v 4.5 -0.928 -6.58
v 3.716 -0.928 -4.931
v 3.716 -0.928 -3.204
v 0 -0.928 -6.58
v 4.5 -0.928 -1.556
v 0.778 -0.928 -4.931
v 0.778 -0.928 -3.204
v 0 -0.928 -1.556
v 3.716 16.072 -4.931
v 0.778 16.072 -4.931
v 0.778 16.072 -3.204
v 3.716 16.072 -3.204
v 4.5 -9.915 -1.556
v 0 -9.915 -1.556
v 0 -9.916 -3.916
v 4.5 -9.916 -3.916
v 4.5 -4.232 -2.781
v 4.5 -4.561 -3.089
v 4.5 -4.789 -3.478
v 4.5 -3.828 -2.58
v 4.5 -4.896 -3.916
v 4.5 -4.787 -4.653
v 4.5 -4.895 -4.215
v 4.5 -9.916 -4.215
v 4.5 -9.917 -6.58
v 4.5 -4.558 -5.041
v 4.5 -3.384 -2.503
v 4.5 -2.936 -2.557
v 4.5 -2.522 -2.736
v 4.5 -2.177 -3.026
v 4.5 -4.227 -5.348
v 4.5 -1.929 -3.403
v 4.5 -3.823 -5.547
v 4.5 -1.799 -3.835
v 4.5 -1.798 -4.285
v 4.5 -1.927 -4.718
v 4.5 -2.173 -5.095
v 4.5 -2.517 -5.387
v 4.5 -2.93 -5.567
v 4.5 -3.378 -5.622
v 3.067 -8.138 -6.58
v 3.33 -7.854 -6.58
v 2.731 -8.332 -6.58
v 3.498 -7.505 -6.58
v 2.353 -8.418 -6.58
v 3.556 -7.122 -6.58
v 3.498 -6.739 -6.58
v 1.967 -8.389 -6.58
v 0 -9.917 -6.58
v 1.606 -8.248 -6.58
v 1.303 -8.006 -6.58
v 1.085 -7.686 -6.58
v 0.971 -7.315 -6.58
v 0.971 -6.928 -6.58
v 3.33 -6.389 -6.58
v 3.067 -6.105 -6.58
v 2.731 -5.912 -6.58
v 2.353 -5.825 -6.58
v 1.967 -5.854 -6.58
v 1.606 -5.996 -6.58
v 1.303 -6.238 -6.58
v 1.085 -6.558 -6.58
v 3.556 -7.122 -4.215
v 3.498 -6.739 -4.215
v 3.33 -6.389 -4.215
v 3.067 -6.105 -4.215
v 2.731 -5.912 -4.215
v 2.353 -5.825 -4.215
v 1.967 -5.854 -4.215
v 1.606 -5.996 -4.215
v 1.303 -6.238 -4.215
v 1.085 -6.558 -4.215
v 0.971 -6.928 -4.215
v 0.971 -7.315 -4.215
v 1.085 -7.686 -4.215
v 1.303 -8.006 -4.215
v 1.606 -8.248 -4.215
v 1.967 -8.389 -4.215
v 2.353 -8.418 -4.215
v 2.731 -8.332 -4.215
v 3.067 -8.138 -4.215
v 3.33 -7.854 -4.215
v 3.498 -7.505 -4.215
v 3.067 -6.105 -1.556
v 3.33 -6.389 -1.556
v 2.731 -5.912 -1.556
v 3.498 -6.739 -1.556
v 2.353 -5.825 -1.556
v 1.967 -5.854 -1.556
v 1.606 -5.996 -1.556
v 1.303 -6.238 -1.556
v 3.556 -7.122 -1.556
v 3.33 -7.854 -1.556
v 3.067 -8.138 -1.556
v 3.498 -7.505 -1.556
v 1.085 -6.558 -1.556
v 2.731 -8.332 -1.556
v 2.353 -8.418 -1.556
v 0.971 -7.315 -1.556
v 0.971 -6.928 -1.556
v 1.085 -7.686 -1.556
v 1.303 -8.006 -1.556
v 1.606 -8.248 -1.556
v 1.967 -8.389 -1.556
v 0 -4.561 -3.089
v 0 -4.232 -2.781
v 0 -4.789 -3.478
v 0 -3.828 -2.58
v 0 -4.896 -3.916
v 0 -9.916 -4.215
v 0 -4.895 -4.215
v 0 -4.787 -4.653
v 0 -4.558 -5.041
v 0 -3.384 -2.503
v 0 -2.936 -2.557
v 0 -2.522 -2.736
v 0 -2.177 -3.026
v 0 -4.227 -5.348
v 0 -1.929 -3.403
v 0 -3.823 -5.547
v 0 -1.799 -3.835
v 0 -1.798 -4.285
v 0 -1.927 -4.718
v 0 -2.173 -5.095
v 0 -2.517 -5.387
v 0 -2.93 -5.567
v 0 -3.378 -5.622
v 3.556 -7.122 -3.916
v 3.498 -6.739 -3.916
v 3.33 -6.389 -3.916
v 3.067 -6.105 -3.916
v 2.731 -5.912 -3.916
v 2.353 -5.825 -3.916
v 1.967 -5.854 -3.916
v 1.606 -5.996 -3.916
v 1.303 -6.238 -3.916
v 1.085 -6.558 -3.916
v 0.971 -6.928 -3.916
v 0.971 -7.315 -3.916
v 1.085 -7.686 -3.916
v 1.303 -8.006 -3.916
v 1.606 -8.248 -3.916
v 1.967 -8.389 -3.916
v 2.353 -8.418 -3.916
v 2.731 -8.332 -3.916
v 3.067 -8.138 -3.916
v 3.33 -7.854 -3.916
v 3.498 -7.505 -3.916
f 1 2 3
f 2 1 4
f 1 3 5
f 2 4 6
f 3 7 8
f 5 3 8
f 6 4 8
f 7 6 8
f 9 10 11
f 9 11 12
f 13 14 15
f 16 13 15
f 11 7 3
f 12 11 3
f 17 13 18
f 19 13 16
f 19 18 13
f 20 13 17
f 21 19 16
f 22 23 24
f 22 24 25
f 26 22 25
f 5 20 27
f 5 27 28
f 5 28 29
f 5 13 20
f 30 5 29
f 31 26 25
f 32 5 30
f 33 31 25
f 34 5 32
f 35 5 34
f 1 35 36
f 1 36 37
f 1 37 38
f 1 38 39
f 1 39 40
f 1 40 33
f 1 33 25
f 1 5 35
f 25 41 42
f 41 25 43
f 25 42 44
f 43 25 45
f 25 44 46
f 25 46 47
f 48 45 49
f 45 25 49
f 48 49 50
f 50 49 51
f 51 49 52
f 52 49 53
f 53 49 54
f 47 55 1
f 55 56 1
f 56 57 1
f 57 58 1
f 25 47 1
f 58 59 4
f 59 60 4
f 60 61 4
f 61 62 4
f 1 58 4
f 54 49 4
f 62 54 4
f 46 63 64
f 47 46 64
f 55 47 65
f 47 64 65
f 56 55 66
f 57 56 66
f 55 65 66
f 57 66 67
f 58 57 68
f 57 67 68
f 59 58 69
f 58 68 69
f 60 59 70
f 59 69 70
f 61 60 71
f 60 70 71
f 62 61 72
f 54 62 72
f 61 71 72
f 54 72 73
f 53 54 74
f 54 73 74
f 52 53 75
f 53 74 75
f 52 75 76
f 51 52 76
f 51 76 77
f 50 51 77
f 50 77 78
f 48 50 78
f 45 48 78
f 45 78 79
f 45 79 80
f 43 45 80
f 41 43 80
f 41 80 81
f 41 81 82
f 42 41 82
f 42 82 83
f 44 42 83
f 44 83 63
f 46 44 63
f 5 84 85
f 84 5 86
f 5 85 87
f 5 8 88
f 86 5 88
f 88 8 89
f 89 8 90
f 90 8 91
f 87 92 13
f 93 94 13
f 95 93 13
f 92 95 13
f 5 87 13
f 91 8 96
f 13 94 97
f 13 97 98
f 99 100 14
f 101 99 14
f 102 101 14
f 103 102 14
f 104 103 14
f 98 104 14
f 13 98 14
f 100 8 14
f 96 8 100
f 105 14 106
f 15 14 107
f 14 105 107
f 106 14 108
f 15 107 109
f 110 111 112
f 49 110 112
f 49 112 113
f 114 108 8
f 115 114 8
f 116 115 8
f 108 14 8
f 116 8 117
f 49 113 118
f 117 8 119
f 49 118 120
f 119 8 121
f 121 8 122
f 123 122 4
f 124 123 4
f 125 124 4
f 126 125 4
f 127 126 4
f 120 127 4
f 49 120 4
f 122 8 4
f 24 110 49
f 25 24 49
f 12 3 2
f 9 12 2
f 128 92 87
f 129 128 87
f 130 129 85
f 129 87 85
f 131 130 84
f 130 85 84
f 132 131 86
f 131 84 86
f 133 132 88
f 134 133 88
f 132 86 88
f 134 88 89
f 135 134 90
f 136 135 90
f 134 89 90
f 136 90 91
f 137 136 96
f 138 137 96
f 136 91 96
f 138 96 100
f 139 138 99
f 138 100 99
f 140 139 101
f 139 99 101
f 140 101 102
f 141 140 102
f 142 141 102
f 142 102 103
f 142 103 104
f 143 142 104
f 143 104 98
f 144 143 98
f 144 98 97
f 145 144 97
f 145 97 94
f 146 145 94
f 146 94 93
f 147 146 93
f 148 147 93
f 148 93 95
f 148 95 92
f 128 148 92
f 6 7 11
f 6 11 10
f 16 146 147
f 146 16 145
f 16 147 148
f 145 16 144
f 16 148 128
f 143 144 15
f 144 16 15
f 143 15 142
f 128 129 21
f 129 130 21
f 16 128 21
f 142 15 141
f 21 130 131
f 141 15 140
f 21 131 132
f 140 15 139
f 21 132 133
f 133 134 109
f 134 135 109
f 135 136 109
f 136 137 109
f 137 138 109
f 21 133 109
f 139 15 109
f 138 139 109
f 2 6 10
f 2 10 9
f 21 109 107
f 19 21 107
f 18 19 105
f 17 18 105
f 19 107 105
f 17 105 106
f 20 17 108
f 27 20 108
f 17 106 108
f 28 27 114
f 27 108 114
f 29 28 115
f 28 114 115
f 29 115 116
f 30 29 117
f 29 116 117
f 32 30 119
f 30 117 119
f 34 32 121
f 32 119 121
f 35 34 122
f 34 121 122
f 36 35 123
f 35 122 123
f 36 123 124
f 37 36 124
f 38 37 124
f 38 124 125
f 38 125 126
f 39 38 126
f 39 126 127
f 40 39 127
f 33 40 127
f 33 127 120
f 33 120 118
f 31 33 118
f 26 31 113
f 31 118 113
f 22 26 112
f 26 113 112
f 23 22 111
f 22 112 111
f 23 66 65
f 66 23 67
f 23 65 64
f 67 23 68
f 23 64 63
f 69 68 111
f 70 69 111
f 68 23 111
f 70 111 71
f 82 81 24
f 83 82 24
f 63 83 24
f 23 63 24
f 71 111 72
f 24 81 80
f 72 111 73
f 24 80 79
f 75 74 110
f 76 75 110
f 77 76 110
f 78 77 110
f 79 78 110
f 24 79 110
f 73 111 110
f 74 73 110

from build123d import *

# Parameters (mm, degrees)
BOSS_EXTRUDE2_DEPTH = 4.5
SKETCH3_R           = 1.3
CUT_EXTRUDE1_DEPTH  = 10.5
SKETCH6_W           = 2.938556516
SKETCH6_H           = 1.727001967
BOSS_EXTRUDE5_DEPTH = 17


with BuildPart() as part:
    # Sketch1 → Boss-Extrude2 (new body)
    with BuildSketch(Plane(origin=(0, 0, 0), x_dir=(0, 0, -1), z_dir=(1, 0, 0))):
        with BuildLine():
            Line((1.55613054, -9.91539795), (3.9164982, -9.916319844))
            Line((3.9164982, -9.916319844), (3.9164982, -4.895563354))
            ThreePointArc((3.9164982, -4.895563354), (4.059992057, -1.782444065), (4.214804462, -4.895021022))
            Line((4.214804462, -4.895021022), (4.214804462, -9.916436354))
            Line((4.214804462, -9.916436354), (6.579674081, -9.917360006))
            Line((6.579674081, -9.917360006), (6.579674081, -0.928463249))
            Line((6.579674081, -0.928463249), (1.55613054, -0.928463249))
            Line((1.55613054, -0.928463249), (1.55613054, -9.91539795))
        make_face()
    extrude(amount=BOSS_EXTRUDE2_DEPTH)

    # Sketch3 → Cut-Extrude1 (cut)
    with BuildSketch(Plane.XY.offset(-1.55613054)):
        with Locations((2.256029543, -7.121731935)):
            Circle(SKETCH3_R)
    extrude(amount=-CUT_EXTRUDE1_DEPTH, mode=Mode.SUBTRACT)

    # Sketch6 → Boss-Extrude5 (add)
    with BuildSketch(Plane(origin=(0, -0.928463249, 0), x_dir=(1, 0, 0), z_dir=(0, 1, 0))):
        with Locations((2.247156979, 4.067903294)):
            Rectangle(SKETCH6_W, SKETCH6_H)
    extrude(amount=BOSS_EXTRUDE5_DEPTH)


solid = part.part
